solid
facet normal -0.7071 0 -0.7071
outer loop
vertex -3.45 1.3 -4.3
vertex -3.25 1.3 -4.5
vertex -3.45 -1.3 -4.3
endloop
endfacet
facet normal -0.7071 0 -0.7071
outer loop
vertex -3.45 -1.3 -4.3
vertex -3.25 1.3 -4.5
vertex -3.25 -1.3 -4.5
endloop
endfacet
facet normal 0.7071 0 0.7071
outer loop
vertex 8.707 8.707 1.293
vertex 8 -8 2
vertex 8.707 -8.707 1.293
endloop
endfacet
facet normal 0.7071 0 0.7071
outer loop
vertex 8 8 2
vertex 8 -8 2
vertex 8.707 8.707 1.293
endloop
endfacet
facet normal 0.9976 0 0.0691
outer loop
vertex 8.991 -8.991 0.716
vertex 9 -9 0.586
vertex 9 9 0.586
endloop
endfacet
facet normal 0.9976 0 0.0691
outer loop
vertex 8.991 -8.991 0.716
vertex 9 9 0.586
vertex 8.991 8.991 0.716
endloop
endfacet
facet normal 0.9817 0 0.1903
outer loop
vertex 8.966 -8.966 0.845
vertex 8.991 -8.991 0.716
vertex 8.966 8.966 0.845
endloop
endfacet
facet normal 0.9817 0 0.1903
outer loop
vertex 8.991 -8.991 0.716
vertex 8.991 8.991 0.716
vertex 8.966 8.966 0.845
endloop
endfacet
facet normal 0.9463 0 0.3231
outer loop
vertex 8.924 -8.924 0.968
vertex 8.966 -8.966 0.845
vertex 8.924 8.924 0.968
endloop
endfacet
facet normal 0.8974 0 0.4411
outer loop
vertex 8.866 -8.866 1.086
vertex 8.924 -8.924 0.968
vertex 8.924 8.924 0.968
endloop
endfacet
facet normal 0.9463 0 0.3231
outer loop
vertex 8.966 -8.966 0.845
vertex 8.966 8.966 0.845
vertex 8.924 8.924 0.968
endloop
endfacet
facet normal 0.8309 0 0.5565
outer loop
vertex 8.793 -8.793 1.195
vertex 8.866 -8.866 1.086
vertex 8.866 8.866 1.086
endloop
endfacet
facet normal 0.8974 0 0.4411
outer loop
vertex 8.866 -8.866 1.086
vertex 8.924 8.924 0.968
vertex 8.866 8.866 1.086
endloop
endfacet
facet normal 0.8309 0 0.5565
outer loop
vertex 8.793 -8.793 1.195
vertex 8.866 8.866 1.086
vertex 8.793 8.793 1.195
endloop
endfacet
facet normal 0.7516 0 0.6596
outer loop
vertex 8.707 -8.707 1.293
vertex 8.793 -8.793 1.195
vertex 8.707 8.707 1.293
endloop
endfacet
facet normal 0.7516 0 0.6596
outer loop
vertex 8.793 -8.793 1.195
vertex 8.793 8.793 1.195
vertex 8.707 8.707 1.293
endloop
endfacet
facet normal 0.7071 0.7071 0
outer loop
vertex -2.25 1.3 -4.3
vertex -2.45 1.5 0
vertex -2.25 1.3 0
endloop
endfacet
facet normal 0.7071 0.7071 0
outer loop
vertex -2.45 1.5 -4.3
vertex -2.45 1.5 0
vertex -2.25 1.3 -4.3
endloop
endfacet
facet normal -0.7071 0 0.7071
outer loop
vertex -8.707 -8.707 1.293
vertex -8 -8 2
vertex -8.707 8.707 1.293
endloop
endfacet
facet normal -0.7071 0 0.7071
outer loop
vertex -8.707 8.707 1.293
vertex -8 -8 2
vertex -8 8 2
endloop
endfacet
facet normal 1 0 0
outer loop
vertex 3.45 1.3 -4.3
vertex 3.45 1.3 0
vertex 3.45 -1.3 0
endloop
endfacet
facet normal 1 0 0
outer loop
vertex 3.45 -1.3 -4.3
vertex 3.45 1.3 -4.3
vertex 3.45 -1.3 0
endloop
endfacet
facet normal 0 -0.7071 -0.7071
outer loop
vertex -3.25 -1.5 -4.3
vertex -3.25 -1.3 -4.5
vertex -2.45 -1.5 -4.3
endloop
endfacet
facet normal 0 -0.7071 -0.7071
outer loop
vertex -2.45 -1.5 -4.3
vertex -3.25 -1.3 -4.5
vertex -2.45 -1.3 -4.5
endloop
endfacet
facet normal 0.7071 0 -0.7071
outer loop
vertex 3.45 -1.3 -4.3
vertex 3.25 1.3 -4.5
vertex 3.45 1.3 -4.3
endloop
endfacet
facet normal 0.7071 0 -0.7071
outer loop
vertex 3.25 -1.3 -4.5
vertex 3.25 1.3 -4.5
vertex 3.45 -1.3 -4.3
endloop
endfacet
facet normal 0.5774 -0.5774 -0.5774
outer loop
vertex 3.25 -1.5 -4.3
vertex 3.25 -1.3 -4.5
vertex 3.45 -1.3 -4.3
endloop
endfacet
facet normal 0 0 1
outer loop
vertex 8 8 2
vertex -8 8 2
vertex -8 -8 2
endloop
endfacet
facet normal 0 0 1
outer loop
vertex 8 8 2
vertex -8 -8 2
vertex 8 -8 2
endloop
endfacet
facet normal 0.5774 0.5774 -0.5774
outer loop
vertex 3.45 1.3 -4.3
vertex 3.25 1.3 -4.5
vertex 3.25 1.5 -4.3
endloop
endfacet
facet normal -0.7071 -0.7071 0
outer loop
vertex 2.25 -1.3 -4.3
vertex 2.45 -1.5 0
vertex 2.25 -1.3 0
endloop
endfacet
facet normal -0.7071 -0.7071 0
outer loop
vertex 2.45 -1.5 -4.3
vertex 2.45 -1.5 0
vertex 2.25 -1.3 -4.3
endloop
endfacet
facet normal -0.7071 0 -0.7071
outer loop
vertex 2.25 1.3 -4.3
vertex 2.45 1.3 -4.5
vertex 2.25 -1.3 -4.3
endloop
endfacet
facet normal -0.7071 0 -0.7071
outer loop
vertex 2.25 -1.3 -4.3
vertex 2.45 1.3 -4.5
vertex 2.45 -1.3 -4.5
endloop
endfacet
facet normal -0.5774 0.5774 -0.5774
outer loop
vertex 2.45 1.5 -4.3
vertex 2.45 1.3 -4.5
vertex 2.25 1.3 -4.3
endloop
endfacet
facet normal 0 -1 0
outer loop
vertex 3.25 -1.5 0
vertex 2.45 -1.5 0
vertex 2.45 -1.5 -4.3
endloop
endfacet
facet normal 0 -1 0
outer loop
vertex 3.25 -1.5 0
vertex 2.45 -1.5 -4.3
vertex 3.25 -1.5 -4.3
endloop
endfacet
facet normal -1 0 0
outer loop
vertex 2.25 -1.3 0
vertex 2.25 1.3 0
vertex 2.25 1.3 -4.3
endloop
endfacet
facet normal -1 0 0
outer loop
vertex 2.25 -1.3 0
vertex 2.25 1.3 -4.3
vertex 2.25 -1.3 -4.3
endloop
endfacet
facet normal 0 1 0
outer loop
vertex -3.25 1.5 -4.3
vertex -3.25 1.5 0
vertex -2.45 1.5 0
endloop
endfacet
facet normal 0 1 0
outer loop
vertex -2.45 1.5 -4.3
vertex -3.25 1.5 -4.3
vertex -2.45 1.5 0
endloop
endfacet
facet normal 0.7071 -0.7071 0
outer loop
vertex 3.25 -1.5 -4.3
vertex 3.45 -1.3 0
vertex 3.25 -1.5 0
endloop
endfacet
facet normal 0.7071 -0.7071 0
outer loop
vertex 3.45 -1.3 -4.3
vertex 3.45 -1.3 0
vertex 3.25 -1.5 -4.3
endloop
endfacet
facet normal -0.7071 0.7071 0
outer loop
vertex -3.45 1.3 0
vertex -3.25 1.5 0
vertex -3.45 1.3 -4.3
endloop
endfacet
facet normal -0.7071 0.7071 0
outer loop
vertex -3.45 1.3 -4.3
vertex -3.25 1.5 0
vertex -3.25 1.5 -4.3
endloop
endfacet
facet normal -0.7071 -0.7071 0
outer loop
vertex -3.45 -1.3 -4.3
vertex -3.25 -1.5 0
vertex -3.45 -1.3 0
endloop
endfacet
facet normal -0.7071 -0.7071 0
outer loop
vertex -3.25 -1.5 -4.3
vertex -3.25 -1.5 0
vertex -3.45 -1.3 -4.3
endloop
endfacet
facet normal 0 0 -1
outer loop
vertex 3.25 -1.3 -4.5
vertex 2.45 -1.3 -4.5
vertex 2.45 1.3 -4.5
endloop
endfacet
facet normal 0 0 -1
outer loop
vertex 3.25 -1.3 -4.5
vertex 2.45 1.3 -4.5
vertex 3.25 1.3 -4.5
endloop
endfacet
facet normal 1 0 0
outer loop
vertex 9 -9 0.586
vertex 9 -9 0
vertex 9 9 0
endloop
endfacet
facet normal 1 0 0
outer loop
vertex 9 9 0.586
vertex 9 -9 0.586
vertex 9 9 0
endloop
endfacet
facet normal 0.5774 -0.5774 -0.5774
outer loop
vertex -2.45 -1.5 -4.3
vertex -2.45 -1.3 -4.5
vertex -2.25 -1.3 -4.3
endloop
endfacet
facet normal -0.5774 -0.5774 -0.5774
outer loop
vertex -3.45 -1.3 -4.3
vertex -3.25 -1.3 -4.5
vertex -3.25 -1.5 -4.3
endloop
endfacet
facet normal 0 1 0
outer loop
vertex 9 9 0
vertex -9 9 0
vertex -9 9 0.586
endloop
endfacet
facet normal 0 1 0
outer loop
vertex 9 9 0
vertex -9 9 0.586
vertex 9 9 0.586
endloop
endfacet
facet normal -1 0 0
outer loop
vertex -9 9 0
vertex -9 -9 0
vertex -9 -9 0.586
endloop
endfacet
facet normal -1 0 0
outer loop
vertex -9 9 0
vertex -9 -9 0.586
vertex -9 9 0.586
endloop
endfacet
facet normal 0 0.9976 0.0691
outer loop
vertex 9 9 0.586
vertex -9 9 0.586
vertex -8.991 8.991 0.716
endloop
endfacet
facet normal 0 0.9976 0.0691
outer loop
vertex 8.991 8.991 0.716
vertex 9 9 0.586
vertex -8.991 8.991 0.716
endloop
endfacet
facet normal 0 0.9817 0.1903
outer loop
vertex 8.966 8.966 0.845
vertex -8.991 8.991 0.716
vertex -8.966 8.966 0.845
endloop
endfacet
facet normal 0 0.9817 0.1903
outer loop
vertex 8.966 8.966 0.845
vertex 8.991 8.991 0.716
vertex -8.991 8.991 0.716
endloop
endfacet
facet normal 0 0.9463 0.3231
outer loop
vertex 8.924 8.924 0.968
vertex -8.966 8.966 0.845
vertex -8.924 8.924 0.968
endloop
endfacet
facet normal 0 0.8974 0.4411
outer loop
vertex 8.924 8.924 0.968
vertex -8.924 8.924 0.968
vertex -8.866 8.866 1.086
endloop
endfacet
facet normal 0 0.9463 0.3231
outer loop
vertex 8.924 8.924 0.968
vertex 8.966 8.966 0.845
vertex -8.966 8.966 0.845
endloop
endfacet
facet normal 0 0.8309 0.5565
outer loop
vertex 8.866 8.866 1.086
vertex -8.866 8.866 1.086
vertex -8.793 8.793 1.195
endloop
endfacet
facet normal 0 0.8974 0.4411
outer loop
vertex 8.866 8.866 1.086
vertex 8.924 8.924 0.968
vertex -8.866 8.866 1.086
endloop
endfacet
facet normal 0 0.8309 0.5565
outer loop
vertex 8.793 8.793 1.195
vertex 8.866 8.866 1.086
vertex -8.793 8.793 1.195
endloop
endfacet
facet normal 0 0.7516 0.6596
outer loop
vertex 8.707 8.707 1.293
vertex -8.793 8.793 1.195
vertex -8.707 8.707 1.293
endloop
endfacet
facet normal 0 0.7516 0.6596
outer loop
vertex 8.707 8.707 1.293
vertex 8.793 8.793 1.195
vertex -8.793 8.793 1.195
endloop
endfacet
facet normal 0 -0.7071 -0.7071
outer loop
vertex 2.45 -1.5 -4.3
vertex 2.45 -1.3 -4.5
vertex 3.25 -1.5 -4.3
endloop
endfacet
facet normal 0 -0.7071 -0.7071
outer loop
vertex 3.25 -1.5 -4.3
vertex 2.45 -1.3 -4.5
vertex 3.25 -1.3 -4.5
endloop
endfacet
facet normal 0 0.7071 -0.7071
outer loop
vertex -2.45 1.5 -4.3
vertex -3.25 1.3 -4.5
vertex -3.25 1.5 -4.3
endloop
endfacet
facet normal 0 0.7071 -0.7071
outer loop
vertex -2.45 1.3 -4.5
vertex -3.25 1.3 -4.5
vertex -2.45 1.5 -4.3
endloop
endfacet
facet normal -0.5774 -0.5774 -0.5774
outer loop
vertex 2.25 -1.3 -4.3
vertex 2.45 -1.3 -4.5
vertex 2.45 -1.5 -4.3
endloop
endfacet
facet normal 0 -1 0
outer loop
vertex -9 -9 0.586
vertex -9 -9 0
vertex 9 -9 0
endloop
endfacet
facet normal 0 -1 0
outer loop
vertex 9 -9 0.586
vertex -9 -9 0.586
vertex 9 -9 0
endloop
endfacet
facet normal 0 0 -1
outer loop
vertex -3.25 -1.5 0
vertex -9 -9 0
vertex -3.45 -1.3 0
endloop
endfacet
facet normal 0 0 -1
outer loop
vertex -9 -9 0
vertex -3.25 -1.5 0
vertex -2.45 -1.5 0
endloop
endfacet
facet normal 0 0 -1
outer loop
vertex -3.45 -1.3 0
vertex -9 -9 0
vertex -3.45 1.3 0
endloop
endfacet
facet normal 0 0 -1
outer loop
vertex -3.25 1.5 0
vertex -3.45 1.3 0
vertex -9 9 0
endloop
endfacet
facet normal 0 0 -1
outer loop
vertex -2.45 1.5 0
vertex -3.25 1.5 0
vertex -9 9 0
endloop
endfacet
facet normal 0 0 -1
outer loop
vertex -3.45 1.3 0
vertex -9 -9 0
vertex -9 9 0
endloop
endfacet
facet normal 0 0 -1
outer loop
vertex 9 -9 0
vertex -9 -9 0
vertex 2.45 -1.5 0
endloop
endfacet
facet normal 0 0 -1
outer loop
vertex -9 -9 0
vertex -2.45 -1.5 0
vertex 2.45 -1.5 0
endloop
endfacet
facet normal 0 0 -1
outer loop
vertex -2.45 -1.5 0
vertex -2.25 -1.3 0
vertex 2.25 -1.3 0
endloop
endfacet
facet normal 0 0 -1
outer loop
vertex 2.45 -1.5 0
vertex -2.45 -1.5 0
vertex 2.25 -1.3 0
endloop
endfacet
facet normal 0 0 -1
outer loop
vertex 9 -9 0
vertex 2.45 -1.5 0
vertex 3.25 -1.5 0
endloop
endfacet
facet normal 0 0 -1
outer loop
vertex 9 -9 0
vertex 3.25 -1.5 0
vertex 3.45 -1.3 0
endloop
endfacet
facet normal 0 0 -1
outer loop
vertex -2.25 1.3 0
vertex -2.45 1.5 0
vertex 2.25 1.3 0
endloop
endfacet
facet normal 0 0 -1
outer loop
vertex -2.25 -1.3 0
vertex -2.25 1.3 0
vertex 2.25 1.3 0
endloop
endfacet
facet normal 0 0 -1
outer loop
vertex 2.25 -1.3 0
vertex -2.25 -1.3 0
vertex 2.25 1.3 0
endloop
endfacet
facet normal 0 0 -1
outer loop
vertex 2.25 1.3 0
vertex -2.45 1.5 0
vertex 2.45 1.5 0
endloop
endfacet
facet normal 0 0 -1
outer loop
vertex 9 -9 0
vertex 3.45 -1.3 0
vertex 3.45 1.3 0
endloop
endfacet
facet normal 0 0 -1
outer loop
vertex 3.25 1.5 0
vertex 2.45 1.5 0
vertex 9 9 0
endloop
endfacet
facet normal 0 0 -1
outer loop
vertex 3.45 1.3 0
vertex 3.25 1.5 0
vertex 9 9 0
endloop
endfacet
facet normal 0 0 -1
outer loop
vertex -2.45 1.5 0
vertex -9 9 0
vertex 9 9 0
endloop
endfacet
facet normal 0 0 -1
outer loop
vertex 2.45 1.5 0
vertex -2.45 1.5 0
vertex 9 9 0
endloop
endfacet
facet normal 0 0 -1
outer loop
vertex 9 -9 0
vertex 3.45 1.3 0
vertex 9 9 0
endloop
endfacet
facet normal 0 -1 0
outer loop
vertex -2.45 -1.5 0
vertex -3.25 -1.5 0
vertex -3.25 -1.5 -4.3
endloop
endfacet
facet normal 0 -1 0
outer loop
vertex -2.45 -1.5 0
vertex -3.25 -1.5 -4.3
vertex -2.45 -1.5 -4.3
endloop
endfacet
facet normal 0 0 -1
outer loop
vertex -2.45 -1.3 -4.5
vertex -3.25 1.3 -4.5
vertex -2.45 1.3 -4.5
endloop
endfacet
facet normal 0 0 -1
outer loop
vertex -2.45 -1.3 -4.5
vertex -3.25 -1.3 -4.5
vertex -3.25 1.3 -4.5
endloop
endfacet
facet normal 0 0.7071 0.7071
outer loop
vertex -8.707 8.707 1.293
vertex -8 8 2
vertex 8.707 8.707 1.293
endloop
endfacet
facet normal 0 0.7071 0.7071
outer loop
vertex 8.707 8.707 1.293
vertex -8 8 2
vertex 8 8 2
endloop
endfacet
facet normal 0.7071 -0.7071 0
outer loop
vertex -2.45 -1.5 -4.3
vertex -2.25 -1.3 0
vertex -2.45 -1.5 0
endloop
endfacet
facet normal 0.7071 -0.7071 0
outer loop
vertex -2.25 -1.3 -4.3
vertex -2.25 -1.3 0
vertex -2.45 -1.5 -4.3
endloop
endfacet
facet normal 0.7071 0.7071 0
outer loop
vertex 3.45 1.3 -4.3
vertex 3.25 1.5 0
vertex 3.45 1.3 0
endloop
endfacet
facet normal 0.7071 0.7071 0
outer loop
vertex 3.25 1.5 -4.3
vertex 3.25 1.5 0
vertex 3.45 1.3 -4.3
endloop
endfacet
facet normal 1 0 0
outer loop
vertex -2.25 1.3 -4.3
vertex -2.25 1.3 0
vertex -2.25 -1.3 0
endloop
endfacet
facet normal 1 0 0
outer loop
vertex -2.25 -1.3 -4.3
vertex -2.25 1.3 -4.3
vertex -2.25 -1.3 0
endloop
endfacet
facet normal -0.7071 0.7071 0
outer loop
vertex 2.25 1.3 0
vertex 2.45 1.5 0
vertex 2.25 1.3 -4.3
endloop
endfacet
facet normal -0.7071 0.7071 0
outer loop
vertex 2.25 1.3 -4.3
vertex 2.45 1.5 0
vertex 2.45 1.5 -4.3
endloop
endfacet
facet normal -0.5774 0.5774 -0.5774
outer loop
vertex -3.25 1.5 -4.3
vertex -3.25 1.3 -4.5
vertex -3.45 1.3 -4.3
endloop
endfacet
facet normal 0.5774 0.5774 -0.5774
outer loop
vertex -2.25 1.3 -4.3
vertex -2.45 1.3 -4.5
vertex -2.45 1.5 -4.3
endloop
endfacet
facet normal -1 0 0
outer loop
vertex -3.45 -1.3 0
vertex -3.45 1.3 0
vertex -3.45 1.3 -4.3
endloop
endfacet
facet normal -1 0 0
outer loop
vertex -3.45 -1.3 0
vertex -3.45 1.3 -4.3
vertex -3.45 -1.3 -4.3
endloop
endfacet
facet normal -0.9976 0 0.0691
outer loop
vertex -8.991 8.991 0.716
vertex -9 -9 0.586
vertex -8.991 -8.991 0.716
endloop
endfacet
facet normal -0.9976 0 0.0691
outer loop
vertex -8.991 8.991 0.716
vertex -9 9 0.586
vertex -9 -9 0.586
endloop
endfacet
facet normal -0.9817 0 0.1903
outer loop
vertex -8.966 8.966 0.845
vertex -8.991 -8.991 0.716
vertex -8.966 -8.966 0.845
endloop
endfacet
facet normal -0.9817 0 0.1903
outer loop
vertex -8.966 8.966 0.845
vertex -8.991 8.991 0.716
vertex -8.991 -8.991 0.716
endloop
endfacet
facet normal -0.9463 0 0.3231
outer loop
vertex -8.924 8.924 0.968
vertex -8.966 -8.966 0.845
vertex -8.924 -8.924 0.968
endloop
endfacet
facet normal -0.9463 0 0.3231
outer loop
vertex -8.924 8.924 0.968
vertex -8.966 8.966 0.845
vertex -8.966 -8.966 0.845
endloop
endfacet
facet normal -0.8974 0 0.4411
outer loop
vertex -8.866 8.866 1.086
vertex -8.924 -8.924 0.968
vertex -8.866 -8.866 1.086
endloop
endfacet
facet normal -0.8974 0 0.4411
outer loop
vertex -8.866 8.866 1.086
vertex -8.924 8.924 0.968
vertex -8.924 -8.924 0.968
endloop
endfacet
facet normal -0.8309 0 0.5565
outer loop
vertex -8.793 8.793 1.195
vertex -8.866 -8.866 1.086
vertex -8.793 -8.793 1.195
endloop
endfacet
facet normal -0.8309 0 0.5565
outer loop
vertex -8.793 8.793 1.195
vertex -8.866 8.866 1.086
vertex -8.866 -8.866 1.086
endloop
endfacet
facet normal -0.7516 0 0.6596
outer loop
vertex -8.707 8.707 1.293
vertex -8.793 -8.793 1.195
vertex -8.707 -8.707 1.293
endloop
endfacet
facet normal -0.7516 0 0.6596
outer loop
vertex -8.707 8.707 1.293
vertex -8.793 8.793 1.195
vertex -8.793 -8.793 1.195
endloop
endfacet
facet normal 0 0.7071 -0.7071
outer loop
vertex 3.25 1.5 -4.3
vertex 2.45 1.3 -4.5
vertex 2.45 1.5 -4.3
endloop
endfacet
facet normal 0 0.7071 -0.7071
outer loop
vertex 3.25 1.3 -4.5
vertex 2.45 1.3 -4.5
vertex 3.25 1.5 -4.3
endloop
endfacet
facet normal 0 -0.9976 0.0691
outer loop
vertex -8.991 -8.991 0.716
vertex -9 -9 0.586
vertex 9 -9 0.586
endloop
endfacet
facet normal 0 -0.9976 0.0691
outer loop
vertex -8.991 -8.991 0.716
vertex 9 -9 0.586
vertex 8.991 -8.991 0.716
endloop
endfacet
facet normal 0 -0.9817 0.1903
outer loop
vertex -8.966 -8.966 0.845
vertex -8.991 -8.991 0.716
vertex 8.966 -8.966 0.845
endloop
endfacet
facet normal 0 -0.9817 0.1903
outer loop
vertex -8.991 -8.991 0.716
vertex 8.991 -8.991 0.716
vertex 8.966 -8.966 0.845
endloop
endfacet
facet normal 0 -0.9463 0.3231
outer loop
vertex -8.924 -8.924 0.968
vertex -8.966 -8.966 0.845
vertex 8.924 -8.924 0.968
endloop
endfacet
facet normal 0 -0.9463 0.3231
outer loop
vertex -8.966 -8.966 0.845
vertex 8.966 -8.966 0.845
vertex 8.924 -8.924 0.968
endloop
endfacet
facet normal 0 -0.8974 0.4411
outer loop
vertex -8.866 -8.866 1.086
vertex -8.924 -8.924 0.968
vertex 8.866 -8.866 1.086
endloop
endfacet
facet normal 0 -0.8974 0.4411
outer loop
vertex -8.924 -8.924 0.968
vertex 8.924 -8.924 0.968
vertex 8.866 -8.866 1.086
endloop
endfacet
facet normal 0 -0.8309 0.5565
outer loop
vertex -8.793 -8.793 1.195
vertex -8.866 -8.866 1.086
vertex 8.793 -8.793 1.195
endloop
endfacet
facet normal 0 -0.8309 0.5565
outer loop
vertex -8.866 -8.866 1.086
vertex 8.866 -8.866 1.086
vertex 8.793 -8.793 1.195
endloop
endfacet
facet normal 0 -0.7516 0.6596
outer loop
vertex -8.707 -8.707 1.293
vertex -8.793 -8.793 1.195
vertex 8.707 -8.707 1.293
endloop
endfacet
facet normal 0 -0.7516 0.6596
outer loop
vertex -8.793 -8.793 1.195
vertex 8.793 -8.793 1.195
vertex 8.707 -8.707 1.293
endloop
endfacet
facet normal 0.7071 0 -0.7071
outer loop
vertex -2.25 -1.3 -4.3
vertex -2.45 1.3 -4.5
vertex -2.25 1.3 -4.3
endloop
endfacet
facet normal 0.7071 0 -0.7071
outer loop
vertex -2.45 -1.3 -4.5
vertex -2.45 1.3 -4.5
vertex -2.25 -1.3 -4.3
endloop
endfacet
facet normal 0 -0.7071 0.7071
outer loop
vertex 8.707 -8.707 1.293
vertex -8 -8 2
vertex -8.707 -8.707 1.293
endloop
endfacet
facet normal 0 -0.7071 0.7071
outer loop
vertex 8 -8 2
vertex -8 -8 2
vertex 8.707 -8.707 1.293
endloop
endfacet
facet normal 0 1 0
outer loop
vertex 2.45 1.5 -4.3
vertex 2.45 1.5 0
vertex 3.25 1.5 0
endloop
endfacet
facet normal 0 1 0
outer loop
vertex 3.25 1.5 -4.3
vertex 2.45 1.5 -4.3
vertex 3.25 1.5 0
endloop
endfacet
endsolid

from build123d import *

# Parameters (mm, degrees)
SKETCH_W        = 18
SKETCH_H        = 18
PAD_DEPTH       = 2
CHAMFER_SIZE    = 1
FILLET_R        = 1
COPYSKETCH002_W = 1.2
COPYSKETCH002_H = 3
PAD001_DEPTH    = 4.5
CHAMFER001_SIZE = 0.2


with BuildPart() as part:
    # Sketch → Pad (new body)
    with BuildSketch(Plane.XY):
        Rectangle(SKETCH_W, SKETCH_H)
    extrude(amount=PAD_DEPTH)

    # Chamfer
    chamfer_edges = [part.edges().sort_by_distance(p)[0] for p in [
        (-9, 0, 2),
        (0, 9, 2),
        (9, 0, 2),
        (0, -9, 2),
    ]]
    chamfer(chamfer_edges, length=CHAMFER_SIZE)

    # Fillet
    fillet_edges = [part.edges().sort_by_distance(p)[0] for p in [
        (0, -9, 1),
        (9, 0, 1),
        (-9, 0, 1),
        (0, 9, 1),
    ]]
    fillet(fillet_edges, radius=FILLET_R)

    # CopySketch002 → Pad001 (join)
    with BuildSketch(Plane(origin=(0, 0, 0), x_dir=(1, 0, 0), z_dir=(0, 0, -1))):
        with Locations((-2.85, 0)):
            Rectangle(COPYSKETCH002_W, COPYSKETCH002_H)
        with Locations((2.85, 0)):
            Rectangle(COPYSKETCH002_W, COPYSKETCH002_H)
    extrude(amount=PAD001_DEPTH)

    # Chamfer001
    chamfer001_edges = [part.edges().sort_by_distance(p)[0] for p in [
        (-2.85, 1.5, -4.5),
        (-3.45, 0, -4.5),
        (-2.85, -1.5, -4.5),
        (-2.25, 0, -4.5),
        (-3.45, 1.5, -2.25),
        (-2.25, 1.5, -2.25),
        (-3.45, -1.5, -2.25),
        (-2.25, -1.5, -2.25),
        (2.85, -1.5, -4.5),
        (2.25, 0, -4.5),
        (2.85, 1.5, -4.5),
        (3.45, 0, -4.5),
        (3.45, -1.5, -2.25),
        (2.25, -1.5, -2.25),
        (2.25, 1.5, -2.25),
        (3.45, 1.5, -2.25),
    ]]
    chamfer(chamfer001_edges, length=CHAMFER001_SIZE)


solid = part.part
